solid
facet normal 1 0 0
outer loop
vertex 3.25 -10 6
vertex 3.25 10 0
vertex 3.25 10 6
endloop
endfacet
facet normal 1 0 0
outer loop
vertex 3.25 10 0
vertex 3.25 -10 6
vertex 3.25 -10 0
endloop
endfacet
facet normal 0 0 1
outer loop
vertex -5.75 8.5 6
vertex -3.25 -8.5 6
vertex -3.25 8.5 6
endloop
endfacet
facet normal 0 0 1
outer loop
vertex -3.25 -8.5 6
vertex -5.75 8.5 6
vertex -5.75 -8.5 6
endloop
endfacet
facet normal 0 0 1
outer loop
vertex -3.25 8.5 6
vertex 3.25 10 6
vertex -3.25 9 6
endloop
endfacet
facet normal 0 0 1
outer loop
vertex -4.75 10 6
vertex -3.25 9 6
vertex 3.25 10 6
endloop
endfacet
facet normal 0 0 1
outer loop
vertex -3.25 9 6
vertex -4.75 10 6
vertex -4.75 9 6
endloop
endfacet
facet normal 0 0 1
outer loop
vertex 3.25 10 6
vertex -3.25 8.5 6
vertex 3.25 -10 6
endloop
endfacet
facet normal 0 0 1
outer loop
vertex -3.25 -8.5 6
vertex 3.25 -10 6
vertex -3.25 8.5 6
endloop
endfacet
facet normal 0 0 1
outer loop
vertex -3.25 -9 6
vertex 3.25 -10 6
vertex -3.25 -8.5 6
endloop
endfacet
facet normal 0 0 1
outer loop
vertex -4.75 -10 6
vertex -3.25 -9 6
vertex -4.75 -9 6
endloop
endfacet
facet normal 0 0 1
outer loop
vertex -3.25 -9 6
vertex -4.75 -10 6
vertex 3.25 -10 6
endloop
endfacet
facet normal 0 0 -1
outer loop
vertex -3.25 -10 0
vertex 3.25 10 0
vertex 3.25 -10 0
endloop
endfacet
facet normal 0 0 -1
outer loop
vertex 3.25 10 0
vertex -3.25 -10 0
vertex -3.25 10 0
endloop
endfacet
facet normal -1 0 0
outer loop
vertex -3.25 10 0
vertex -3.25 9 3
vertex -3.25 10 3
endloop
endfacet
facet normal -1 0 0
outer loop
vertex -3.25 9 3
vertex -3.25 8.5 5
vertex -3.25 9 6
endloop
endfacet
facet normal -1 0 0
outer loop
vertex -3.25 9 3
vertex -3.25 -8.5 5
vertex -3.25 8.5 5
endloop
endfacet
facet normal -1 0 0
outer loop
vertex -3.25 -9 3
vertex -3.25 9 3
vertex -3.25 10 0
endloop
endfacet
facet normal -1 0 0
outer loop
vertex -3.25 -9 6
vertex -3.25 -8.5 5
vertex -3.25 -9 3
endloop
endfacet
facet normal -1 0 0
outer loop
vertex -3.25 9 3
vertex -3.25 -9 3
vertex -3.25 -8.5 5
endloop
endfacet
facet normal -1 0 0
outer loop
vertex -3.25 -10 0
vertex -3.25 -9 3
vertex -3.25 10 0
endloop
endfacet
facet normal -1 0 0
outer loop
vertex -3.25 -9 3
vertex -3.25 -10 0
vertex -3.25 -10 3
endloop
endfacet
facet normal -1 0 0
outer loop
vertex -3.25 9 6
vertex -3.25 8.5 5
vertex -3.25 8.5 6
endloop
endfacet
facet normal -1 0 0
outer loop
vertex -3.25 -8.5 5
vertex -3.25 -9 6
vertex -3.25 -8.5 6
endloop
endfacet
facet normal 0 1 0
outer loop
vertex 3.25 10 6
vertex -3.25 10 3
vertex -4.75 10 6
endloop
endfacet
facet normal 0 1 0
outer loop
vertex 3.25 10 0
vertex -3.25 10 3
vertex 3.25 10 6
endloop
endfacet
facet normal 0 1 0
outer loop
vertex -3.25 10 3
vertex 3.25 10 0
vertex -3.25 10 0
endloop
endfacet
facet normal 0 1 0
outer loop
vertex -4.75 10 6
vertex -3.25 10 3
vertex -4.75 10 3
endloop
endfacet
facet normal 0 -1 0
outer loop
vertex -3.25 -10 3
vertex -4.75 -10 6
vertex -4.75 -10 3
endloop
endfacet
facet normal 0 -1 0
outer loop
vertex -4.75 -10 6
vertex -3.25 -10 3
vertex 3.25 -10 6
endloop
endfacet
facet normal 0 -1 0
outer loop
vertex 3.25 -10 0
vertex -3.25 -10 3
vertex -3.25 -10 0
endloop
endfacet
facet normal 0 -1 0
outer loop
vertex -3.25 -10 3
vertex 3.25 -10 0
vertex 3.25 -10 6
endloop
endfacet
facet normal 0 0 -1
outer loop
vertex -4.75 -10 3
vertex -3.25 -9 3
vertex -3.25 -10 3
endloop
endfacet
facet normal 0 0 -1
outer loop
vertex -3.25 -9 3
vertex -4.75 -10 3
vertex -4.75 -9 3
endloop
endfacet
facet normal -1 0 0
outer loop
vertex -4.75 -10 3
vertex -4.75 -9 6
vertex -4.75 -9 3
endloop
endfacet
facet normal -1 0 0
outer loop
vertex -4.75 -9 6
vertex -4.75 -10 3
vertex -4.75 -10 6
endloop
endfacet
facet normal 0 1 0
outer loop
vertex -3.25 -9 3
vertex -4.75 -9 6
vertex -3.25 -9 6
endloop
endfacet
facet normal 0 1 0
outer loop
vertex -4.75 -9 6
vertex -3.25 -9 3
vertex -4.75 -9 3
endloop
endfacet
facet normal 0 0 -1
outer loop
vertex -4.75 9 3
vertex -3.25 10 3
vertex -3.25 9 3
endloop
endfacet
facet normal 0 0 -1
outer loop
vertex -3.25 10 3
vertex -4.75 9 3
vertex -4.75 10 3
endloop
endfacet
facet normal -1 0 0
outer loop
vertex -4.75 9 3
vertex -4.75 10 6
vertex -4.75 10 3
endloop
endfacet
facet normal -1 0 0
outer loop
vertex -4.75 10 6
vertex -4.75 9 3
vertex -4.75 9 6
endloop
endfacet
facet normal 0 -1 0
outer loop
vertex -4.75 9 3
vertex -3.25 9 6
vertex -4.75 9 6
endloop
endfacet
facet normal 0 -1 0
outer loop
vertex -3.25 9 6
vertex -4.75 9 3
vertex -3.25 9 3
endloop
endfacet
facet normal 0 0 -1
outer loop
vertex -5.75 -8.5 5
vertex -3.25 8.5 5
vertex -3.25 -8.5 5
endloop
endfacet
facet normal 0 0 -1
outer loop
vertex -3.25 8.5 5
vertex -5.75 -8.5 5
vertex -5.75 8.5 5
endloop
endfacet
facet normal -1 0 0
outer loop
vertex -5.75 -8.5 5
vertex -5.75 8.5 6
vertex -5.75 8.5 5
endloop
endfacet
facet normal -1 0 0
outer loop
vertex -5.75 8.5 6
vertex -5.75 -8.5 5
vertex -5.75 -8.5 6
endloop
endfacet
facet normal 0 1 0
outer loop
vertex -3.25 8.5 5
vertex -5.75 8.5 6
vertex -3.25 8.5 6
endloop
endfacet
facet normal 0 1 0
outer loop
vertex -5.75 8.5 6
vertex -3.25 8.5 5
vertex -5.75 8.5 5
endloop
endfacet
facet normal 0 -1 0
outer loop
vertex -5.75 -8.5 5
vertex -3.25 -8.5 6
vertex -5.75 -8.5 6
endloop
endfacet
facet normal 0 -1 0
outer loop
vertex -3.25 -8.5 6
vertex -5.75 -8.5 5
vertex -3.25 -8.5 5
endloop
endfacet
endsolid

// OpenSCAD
translate([-3.25,-10,0])cube([6.5,20,6]);
translate([-4.75,-10,3])cube([2.5,1,3]);
translate([-4.75,9,3])cube([2.5,1,3]);
translate([-5.75,-8.5,5])cube([3.5,17,1]);
